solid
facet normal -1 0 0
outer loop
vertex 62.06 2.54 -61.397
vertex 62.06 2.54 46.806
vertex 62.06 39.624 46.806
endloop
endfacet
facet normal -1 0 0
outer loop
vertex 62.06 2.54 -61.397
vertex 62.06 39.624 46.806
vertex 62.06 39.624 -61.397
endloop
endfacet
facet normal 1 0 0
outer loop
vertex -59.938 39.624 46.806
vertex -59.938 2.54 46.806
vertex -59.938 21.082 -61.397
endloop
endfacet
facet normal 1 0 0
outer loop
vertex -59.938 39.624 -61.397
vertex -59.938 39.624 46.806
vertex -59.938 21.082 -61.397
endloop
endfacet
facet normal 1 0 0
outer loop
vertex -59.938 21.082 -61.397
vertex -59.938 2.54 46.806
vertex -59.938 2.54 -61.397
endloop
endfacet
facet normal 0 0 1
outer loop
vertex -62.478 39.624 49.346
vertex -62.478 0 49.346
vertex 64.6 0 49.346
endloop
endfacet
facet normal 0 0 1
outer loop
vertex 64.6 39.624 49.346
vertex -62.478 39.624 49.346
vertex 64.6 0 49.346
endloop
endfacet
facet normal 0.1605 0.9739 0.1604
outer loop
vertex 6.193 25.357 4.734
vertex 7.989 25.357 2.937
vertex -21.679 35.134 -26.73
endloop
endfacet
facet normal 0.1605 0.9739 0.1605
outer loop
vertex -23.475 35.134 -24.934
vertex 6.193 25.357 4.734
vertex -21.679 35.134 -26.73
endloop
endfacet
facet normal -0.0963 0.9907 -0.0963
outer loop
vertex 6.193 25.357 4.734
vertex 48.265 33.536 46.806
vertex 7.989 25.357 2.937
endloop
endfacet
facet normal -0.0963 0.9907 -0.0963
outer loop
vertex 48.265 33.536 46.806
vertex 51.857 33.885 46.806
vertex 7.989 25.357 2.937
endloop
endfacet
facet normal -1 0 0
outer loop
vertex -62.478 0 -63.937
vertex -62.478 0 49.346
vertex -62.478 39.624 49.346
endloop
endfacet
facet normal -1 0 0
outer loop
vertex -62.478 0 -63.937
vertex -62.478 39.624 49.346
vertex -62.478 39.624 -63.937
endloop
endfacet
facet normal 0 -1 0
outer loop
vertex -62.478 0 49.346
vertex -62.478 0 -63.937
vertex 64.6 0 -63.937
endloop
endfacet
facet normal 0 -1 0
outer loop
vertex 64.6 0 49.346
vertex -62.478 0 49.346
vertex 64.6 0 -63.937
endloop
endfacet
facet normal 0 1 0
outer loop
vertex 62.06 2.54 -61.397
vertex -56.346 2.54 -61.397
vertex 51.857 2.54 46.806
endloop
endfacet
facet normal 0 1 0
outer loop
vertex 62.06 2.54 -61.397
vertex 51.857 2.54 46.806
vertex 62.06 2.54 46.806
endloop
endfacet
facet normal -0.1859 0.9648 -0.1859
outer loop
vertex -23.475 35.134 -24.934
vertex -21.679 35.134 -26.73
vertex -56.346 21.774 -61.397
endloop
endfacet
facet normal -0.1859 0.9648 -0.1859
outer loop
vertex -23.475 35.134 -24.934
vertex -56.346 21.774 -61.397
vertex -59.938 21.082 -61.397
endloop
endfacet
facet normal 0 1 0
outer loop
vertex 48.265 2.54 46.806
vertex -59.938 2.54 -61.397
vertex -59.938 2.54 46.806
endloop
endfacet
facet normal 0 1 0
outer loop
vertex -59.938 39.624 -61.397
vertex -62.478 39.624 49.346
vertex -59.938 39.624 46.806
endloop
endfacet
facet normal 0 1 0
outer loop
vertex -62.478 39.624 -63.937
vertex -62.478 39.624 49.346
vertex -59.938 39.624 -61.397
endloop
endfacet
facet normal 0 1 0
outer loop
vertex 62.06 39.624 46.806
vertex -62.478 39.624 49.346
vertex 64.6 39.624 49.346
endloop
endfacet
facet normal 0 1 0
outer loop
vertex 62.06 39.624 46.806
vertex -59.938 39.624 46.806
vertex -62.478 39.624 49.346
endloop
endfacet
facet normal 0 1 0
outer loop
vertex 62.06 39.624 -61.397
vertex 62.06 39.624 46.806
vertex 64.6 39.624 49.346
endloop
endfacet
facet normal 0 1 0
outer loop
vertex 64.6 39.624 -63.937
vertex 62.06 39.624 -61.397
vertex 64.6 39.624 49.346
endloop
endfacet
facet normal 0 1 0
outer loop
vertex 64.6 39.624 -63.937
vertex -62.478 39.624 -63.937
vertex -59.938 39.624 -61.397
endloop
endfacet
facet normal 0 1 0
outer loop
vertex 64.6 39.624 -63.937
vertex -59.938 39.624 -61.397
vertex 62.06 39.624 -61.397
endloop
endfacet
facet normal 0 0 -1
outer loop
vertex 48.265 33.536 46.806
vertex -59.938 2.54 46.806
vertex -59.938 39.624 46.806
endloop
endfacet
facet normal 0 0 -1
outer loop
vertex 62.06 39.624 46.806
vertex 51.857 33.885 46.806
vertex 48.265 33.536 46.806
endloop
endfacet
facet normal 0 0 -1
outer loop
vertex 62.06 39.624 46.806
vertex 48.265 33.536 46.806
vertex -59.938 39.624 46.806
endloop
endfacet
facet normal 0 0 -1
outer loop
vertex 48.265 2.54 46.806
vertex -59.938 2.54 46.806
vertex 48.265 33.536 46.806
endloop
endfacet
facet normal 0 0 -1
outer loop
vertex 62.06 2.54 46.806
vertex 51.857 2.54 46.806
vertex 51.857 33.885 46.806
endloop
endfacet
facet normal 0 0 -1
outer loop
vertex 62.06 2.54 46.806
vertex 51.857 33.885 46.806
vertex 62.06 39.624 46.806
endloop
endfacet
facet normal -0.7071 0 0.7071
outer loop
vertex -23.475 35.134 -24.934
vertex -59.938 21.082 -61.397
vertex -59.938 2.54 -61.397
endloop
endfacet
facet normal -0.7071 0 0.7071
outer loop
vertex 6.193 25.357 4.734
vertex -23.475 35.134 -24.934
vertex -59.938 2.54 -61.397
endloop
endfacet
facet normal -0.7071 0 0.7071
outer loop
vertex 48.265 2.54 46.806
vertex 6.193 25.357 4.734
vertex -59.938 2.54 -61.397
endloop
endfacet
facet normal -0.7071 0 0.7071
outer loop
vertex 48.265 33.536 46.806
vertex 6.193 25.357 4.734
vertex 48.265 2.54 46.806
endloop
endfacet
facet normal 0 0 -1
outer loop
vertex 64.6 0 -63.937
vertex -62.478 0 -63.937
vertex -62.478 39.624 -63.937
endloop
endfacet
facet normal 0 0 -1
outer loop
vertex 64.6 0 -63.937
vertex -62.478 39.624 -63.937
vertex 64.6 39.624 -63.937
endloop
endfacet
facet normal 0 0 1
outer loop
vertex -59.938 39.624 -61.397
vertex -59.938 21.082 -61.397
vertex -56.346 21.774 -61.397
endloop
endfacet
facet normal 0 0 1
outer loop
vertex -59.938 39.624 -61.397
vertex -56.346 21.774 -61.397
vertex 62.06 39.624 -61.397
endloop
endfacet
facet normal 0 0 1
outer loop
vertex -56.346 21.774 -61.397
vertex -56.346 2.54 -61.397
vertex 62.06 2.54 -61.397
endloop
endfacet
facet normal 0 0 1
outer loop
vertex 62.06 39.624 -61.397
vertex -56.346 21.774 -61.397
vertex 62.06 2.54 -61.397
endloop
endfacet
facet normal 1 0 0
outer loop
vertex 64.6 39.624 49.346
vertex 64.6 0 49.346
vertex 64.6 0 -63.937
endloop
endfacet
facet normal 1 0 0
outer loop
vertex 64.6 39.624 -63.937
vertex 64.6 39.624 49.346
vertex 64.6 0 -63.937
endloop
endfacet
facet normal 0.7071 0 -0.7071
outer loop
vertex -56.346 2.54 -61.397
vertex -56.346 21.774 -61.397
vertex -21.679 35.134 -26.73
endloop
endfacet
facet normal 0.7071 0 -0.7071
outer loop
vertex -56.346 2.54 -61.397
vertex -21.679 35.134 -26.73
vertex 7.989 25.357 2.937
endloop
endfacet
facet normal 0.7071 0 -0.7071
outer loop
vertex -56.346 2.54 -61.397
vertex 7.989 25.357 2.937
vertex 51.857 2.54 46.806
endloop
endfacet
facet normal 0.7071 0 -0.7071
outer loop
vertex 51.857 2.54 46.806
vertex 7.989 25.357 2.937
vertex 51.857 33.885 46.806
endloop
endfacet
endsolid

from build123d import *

# Parameters (mm, degrees)
SKETCH1_W                  = 127.078191072
SKETCH1_H                  = 113.282646321
BOSS_EXTRUDE1_DEPTH        = 39.624
SHELL_1_T                  = -2.54
OFFICIAL_RIB_BLOCK20_START = -2.54
OFFICIAL_RIB_BLOCK20_DEPTH = 2.54


with BuildPart() as part:
    # Sketch1 → Boss-Extrude1 (new body)
    with BuildSketch(Plane(origin=(0, 0, 0), x_dir=(1, 0, 0), z_dir=(0, 1, 0))):
        with Locations((1.06119575, 7.295720781)):
            Rectangle(SKETCH1_W, SKETCH1_H)
    extrude(amount=BOSS_EXTRUDE1_DEPTH)

    # 抽壳1
    shell_1_openings = [part.faces().sort_by_distance(p)[0] for p in [
        (1.06119575, 39.624, -7.295720782),
    ]]
    offset(amount=SHELL_1_T, openings=shell_1_openings, kind=Kind.INTERSECTION)

    # official_rib_block20: read off the stored shape, not the designer's step
    # official_rib_block20 outline → official_rib_block20 (add)
    with BuildSketch(Plane(origin=(0.729572078, 0, -0.729572078), x_dir=(0.7071067811865477, 0, 0.7071067811865475), z_dir=(-0.7071067811865475, 0, 0.7071067811865477)).offset(OFFICIAL_RIB_BLOCK20_START)):
        Polygon((-85.796761505, 21.08206499), (-85.796761505, 2.54), (69.764888407, 2.54), (69.764888407, 33.885045833), (7.726, 25.357), (-34.23, 35.134), align=None)
    extrude(amount=OFFICIAL_RIB_BLOCK20_DEPTH)


solid = part.part
